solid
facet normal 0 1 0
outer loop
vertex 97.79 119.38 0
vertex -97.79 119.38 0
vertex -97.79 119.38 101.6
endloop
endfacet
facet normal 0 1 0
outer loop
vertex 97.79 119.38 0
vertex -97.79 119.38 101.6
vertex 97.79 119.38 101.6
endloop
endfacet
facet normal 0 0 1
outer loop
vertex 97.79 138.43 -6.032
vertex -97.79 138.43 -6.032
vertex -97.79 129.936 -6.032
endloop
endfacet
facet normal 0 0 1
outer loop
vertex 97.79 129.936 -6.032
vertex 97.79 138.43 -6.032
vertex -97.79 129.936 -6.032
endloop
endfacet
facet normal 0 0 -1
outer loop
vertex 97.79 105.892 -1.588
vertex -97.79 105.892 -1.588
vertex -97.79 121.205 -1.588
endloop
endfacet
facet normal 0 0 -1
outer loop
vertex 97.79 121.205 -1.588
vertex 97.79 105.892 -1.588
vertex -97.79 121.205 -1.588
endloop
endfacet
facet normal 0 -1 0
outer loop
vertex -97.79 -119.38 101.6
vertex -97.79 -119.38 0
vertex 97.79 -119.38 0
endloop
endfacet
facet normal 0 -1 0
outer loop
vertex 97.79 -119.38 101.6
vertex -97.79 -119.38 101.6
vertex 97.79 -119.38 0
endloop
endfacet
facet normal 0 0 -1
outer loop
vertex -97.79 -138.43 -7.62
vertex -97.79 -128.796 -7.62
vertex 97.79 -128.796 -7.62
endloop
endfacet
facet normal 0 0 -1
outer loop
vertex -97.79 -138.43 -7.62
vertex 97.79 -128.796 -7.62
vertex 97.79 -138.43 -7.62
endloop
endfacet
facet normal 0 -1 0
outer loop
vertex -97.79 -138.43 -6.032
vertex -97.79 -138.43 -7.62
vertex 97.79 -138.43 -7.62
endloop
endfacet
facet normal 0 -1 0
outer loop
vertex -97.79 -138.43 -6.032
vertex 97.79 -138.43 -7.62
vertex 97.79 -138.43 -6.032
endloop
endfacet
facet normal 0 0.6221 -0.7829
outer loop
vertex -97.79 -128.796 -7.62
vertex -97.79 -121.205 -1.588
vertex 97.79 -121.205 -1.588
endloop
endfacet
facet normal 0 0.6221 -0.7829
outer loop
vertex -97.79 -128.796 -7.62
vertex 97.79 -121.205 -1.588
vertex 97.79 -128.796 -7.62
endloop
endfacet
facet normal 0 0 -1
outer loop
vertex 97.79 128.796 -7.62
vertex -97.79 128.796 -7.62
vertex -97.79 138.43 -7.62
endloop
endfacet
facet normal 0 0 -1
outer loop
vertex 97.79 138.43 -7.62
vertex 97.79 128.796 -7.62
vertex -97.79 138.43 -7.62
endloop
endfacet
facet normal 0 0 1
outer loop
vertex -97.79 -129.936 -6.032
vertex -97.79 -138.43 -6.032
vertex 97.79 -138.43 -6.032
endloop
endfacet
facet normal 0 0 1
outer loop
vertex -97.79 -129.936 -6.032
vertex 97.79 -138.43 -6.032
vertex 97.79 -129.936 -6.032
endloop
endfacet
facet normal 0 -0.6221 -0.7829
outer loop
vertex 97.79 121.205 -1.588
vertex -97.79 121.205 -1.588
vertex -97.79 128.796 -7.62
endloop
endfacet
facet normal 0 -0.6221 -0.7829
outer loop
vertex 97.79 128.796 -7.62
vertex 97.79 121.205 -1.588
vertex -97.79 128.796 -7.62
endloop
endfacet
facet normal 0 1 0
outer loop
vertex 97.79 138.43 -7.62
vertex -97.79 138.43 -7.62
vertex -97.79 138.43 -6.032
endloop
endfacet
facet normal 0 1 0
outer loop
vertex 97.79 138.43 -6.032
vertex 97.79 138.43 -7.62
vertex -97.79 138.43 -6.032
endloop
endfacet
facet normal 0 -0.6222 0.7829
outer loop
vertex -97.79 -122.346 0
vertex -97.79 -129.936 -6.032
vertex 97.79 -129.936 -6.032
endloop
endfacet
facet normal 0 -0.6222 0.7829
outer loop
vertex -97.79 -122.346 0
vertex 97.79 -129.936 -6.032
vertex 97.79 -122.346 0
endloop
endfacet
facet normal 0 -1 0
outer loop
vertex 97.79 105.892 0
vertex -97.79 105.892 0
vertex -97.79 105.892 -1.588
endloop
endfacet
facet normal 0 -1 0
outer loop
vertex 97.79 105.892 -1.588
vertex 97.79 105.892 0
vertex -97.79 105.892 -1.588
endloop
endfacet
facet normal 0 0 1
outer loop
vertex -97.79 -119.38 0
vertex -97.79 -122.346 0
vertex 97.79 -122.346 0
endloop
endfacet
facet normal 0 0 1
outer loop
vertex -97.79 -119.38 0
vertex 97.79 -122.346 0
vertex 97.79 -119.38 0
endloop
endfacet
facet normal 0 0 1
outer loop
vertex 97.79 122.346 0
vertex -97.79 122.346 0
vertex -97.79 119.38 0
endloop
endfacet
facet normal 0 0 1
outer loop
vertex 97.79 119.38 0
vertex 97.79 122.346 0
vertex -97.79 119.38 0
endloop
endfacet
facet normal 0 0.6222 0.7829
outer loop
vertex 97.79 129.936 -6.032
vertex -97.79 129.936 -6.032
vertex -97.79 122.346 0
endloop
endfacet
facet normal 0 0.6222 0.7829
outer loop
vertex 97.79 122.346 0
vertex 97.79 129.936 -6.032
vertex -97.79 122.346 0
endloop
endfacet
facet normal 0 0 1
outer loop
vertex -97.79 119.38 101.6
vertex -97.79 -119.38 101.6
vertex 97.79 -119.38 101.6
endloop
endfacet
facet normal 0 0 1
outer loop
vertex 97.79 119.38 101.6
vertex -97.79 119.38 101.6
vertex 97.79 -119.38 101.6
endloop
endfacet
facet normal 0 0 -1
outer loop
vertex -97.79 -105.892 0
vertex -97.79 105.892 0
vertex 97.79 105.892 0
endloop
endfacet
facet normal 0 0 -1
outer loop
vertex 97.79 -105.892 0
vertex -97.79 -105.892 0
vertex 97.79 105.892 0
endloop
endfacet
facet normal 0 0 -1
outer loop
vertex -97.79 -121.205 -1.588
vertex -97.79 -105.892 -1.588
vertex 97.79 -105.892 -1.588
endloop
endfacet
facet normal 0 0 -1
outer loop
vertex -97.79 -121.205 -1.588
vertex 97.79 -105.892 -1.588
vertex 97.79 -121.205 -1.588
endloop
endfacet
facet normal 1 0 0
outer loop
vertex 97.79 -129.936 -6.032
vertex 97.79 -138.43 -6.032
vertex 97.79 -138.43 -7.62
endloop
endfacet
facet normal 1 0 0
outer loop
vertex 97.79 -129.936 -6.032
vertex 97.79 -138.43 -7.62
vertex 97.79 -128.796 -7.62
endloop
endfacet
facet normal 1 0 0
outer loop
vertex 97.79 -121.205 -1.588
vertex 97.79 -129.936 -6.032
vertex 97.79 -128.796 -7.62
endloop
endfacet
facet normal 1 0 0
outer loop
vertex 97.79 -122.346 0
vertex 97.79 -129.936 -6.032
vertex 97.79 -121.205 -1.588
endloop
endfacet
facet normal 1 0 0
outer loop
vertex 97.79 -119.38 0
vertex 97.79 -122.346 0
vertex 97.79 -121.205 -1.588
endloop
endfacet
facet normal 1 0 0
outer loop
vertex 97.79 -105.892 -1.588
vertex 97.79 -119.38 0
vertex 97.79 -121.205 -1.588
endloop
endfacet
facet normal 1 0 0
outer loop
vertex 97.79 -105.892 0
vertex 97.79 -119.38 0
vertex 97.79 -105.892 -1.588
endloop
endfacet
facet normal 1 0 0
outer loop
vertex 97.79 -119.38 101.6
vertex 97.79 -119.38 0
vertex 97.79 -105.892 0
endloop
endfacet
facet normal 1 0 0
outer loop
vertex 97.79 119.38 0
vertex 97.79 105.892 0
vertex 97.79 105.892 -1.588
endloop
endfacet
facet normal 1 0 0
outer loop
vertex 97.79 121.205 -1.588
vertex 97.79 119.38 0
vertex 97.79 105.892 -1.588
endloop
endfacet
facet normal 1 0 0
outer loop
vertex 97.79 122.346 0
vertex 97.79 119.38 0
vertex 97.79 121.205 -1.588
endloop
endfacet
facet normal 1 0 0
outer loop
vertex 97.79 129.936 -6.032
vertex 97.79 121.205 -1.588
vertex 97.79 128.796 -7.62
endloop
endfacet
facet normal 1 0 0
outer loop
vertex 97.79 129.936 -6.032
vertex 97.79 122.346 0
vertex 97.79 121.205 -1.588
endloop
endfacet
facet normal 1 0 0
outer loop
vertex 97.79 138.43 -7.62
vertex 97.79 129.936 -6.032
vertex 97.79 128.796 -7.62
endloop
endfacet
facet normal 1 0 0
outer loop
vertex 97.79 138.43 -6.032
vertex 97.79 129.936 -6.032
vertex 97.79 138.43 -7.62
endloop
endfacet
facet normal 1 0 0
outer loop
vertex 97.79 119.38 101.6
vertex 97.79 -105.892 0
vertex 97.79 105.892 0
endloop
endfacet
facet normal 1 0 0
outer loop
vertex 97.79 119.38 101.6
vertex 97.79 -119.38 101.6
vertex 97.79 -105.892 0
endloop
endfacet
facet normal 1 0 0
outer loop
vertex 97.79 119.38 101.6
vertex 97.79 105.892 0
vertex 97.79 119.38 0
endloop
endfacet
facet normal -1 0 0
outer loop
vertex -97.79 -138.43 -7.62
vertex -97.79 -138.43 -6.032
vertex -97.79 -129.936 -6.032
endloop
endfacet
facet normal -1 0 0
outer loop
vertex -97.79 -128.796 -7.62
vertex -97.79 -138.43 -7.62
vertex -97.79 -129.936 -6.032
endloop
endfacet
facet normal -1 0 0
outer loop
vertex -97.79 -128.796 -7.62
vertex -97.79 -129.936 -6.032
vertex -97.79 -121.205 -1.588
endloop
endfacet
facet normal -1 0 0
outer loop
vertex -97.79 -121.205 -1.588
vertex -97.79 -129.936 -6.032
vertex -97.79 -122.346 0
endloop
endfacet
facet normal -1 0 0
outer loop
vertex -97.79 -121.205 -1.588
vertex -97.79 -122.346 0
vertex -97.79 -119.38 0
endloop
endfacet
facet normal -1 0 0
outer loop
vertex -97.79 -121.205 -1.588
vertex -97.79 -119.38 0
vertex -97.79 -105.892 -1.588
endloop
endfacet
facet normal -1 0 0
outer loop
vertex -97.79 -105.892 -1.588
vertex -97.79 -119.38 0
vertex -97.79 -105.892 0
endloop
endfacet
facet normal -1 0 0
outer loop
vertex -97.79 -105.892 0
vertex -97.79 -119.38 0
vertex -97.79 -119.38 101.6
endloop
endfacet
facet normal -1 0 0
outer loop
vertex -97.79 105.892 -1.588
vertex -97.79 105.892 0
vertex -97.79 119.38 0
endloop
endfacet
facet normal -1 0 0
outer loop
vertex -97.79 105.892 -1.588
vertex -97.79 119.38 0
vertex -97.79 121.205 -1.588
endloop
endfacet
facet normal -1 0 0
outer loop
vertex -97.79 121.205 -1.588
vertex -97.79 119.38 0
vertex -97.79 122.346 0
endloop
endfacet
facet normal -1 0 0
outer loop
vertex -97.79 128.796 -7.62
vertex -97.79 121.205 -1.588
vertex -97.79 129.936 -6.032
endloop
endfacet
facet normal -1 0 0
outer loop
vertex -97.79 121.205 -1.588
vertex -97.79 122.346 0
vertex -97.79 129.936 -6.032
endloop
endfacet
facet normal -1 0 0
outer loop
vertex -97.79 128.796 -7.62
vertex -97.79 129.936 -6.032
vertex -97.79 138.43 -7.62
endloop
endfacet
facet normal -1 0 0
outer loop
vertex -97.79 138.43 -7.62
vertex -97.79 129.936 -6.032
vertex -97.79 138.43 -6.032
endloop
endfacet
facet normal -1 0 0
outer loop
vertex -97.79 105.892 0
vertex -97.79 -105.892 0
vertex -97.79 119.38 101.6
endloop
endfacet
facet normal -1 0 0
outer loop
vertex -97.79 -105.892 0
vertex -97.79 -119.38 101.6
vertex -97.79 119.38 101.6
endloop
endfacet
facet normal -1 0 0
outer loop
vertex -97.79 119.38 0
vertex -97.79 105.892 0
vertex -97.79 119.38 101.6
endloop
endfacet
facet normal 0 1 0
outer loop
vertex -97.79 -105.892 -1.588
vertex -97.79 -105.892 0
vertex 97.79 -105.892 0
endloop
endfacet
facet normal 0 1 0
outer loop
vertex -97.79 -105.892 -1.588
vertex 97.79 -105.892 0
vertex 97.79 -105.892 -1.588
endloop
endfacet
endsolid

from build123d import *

# Parameters (mm, degrees)
F0_W     = 195.58
F0_H     = 238.76
F1_DEPTH = 101.6
F3_DEPTH = 195.58


# Not quite as in the source:
# - a pattern or mirror of a feature is missing from the dataset's text; its kind, count and spacing are read off the source's solid


with BuildPart() as f1:
    # F0 (on Top) → F1 (new body)
    with BuildSketch(Plane.XY):
        Rectangle(F0_W, F0_H)
    extrude(amount=F1_DEPTH)

    # F2 (on face) → F3 (join)
    with BuildSketch(Plane(origin=(-97.79, 0, 0), x_dir=(0, -1, 0), z_dir=(-1, 0, 0))):
        Polygon((122.3456934094, 0), (105.8921615149, 0), (105.8921615149, -1.5875), (121.2054859035, -1.5875), (128.7959814072, -7.62), (138.43, -7.62), (138.43, -6.0325), (129.9361889131, -6.0325), align=None)
    f3 = extrude(amount=-F3_DEPTH)

    # F3_copies: F3 across plane
    add(f3.mirror(Plane.ZX))


solid = f1.part
